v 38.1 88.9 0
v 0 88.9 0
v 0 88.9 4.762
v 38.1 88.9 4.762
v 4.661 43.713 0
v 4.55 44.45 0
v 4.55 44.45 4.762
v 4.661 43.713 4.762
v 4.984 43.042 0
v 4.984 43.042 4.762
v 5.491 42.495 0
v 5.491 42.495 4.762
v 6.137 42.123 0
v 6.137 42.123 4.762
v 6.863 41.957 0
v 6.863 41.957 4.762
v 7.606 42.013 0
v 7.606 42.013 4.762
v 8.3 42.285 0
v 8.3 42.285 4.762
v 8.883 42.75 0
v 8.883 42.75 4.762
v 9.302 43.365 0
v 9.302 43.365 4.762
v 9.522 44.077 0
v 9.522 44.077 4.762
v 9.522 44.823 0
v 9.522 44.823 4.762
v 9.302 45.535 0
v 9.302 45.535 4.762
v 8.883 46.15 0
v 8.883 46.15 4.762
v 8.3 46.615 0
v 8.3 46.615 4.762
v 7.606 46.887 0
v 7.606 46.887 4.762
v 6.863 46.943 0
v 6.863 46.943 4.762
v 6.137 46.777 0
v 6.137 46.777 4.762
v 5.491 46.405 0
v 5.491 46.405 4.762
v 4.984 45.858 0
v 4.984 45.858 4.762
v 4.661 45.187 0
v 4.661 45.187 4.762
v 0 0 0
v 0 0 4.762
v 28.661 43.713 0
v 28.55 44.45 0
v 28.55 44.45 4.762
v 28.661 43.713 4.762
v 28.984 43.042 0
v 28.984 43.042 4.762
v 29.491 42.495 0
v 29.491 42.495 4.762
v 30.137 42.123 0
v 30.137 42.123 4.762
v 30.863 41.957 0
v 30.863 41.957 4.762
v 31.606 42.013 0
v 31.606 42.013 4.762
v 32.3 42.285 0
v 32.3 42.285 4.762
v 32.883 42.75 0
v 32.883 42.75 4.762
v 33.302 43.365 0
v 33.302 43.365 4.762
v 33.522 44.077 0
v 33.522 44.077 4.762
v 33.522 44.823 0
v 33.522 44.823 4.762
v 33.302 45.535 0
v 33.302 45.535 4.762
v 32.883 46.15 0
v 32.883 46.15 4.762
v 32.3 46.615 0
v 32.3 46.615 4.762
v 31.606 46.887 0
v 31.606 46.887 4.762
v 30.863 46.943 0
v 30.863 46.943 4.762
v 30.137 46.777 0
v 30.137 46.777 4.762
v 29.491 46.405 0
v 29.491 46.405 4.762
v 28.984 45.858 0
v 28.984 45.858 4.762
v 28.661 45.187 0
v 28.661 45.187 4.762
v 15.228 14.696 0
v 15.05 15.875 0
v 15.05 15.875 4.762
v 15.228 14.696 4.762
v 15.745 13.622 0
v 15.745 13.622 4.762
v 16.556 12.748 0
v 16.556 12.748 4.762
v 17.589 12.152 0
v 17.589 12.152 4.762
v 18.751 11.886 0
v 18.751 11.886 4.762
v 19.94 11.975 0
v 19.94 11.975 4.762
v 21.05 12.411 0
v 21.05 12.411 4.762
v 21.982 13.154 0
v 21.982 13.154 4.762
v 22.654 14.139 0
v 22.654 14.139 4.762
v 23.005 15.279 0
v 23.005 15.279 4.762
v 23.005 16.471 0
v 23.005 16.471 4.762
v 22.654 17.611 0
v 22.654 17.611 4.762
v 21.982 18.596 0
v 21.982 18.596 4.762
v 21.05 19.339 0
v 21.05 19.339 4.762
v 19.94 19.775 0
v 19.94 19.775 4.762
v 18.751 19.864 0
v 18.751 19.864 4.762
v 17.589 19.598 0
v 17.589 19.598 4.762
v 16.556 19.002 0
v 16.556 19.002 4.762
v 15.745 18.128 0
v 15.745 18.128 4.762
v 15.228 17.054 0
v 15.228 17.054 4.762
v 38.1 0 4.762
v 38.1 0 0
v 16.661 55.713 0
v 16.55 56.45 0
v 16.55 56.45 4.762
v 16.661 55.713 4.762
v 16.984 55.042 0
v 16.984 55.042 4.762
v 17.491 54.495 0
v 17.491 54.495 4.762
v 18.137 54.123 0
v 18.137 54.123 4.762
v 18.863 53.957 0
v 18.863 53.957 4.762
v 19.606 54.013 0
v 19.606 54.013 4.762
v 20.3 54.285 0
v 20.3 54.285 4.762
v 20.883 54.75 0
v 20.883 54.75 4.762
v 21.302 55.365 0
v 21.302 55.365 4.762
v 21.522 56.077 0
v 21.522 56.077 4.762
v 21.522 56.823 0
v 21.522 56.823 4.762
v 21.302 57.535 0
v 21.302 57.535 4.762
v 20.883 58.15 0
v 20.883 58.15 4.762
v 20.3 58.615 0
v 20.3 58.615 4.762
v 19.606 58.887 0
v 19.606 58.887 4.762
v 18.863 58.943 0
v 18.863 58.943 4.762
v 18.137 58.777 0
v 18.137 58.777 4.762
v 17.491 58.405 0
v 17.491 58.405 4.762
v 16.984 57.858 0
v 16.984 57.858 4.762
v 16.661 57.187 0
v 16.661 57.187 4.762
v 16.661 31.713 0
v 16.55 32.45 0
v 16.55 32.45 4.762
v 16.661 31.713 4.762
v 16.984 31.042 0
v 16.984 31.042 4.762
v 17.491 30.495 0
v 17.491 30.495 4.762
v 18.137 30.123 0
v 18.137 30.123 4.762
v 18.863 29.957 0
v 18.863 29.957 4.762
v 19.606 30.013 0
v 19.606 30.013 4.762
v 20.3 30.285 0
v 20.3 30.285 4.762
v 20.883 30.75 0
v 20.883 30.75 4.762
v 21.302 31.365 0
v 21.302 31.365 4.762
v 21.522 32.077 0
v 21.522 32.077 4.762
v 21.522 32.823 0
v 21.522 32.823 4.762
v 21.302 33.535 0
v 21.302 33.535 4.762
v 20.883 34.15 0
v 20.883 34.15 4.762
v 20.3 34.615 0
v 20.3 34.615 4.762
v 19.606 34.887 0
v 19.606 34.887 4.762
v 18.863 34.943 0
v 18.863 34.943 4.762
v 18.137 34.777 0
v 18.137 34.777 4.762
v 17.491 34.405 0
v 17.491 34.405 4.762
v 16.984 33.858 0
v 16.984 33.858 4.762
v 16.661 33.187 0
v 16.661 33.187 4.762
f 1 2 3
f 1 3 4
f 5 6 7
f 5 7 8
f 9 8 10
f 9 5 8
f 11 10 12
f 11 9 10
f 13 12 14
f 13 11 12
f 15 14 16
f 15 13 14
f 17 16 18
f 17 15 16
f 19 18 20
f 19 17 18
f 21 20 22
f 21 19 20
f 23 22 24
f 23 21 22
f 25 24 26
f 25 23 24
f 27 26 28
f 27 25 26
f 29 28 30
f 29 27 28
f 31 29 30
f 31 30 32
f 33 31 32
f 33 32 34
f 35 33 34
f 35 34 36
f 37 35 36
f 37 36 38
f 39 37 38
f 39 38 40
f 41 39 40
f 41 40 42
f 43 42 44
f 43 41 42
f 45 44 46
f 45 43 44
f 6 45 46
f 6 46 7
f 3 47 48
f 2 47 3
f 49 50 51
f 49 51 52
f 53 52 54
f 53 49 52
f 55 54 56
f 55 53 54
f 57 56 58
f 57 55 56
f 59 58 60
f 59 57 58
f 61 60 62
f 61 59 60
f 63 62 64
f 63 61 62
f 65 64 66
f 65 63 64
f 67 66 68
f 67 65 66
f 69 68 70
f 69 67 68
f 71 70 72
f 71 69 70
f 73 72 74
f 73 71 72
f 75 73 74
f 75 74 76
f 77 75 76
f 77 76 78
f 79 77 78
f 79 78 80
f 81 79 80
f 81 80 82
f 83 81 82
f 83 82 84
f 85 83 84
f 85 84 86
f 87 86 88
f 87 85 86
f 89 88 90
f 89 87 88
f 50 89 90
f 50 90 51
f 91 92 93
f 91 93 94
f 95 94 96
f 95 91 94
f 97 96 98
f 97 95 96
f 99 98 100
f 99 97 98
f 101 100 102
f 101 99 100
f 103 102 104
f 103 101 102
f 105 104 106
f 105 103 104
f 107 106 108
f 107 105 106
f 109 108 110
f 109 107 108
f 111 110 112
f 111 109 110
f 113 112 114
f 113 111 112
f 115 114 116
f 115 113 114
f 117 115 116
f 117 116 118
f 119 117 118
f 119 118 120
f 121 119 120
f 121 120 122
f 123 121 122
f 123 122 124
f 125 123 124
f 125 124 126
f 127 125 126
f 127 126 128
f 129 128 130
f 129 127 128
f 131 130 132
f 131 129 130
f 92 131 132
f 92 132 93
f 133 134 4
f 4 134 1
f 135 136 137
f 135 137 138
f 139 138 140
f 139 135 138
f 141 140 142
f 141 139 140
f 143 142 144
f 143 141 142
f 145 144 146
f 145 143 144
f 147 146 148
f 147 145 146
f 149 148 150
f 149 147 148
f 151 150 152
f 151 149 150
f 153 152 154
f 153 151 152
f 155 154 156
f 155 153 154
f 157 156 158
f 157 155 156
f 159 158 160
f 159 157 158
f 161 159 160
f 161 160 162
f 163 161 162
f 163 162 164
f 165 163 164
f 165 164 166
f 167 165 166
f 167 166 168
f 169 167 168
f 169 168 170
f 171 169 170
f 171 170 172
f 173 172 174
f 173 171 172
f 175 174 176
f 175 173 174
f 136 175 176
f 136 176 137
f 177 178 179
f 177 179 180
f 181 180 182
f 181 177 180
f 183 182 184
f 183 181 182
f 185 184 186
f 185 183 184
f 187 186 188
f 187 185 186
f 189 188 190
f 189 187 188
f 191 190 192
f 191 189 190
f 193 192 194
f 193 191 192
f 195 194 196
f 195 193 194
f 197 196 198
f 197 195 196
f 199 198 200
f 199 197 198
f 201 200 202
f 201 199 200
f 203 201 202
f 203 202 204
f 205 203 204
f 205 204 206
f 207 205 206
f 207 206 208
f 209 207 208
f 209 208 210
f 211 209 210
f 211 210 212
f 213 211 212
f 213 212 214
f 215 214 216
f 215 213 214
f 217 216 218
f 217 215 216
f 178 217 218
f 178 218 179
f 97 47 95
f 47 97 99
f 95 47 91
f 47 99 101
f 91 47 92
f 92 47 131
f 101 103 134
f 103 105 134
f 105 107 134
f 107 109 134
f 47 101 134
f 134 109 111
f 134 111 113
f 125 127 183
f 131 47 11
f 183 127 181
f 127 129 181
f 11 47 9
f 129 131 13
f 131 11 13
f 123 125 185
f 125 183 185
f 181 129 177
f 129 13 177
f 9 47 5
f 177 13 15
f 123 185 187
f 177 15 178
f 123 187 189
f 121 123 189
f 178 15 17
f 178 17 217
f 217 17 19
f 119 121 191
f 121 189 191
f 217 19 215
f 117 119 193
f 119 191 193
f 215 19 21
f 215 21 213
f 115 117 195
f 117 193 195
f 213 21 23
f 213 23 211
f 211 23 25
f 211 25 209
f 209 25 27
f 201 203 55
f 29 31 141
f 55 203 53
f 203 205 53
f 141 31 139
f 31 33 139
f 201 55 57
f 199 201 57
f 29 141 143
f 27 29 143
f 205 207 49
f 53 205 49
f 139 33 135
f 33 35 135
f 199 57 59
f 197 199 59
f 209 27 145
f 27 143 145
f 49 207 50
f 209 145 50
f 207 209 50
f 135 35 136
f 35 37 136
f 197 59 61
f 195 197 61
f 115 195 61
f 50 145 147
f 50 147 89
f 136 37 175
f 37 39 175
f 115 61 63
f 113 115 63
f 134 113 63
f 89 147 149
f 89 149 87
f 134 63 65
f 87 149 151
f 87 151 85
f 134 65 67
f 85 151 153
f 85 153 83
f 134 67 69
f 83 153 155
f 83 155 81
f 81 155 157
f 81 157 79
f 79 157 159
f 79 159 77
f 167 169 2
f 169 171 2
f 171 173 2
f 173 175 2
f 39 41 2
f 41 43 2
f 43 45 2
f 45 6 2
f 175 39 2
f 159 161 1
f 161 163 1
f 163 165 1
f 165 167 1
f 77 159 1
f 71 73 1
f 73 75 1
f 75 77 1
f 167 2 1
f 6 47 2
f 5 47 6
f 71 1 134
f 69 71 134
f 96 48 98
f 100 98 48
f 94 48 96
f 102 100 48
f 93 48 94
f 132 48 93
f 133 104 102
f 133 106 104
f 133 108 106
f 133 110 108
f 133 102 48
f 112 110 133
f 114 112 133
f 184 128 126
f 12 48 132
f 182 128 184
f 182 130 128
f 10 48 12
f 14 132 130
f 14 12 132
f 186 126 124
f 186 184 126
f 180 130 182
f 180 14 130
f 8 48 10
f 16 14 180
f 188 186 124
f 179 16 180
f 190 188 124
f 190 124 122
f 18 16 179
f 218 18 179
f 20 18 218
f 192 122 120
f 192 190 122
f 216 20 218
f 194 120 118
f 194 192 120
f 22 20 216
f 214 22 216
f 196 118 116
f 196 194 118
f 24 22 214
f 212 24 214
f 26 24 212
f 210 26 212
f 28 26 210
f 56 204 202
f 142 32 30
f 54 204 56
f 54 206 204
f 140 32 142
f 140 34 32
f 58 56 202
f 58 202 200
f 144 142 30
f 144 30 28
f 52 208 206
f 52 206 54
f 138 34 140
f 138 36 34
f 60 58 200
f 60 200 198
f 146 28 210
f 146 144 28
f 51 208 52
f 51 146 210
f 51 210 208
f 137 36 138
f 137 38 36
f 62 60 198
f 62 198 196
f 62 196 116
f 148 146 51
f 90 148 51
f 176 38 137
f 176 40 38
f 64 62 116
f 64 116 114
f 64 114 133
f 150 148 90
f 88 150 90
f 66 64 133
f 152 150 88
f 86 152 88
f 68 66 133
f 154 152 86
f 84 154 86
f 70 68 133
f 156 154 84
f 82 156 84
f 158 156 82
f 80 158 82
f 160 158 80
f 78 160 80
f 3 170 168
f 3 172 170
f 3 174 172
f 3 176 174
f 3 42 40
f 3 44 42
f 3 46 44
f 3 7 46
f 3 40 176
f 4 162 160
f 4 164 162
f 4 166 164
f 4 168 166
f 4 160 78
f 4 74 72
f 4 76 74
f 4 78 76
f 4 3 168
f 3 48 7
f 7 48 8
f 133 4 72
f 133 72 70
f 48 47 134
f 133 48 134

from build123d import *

# Parameters (mm, degrees)
SKETCH1_W           = 38.1
SKETCH1_H           = 88.9
SKETCH1_R           = 2.5
SKETCH1_R_2         = 4
BOSS_EXTRUDE1_DEPTH = 4.7625


with BuildPart() as part:
    # Sketch1 → Boss-Extrude1 (new body)
    with BuildSketch(Plane.XY):
        with Locations((19.05, 44.45)):
            Rectangle(SKETCH1_W, SKETCH1_H)
        with Locations(Location((19.05, 56.45, 0), (0, 0, 180))):
            Circle(SKETCH1_R, mode=Mode.SUBTRACT)
        with Locations(Location((31.05, 44.45, 0), (0, 0, 180))):
            Circle(SKETCH1_R, mode=Mode.SUBTRACT)
        with Locations(Location((19.05, 32.45, 0), (0, 0, 180))):
            Circle(SKETCH1_R, mode=Mode.SUBTRACT)
        with Locations(Location((7.05, 44.45, 0), (0, 0, 180))):
            Circle(SKETCH1_R, mode=Mode.SUBTRACT)
        with Locations(Location((19.05, 15.875, 0), (0, 0, 180))):
            Circle(SKETCH1_R_2, mode=Mode.SUBTRACT)
    extrude(amount=BOSS_EXTRUDE1_DEPTH)


solid = part.part
